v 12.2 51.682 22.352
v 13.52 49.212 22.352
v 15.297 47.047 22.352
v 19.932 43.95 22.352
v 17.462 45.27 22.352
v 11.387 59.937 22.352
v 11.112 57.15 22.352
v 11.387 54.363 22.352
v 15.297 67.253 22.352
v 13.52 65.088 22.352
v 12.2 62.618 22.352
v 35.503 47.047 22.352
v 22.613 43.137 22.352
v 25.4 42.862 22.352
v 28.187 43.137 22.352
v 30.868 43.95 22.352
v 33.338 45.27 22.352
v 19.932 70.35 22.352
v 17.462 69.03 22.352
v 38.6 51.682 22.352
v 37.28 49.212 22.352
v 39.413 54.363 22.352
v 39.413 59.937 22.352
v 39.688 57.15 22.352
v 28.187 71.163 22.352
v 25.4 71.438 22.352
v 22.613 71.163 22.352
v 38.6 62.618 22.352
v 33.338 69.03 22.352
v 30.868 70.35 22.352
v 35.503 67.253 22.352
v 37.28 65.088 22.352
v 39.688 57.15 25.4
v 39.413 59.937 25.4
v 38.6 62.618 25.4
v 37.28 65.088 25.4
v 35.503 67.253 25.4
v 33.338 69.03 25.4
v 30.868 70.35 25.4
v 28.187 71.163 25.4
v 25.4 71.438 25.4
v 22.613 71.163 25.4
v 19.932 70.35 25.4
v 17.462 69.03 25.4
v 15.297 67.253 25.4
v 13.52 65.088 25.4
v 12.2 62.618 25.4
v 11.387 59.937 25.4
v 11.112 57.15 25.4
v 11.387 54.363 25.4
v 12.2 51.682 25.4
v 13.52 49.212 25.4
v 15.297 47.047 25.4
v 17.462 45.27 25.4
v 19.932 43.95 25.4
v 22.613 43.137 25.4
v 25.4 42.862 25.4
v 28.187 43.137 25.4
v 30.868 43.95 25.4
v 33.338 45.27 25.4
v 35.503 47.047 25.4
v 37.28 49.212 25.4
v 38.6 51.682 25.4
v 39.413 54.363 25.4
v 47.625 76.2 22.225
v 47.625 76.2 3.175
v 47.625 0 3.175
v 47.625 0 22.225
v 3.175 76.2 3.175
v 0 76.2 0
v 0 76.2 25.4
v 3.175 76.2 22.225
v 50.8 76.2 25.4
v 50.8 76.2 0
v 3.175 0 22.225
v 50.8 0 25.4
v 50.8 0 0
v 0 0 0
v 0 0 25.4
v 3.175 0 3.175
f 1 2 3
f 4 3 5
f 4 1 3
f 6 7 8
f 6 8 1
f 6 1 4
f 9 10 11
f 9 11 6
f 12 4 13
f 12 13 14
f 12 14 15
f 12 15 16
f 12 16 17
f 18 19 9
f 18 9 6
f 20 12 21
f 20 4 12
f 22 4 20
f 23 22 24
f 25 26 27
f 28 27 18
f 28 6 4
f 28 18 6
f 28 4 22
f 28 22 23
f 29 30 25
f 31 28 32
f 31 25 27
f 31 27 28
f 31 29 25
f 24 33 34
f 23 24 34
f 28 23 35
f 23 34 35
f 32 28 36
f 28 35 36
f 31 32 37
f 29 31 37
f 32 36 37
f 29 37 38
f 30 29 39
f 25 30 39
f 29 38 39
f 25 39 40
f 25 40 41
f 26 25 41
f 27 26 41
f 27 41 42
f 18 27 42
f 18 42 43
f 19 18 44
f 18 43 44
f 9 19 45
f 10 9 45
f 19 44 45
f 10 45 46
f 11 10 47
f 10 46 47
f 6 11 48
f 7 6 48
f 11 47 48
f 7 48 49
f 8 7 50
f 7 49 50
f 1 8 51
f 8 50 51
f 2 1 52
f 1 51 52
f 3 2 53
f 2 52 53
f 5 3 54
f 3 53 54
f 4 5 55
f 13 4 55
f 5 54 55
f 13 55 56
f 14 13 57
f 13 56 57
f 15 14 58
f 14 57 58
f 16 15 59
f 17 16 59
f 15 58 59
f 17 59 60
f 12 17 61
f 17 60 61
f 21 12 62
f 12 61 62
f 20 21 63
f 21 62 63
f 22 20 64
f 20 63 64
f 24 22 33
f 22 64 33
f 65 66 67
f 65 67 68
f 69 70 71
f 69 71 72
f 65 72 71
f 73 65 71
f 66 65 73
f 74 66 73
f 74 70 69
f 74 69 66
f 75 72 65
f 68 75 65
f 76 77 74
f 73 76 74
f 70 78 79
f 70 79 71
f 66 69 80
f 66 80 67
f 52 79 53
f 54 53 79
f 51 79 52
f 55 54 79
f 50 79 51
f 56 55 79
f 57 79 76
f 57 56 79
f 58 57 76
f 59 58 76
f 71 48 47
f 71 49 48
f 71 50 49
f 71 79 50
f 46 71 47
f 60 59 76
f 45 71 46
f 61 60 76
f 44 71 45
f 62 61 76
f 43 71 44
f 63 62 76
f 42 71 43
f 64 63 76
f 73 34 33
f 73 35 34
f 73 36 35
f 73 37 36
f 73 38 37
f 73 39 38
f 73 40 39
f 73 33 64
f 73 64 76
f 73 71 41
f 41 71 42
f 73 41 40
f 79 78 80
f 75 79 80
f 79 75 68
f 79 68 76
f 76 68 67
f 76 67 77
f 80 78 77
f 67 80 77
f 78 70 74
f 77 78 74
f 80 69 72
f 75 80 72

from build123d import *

# Parameters (mm, degrees)
SKETCH1_W           = 50.8
SKETCH1_H           = 76.2
BOSS_EXTRUDE1_DEPTH = 25.4
SKETCH2_W           = 44.45
SKETCH2_H           = 19.05
CUT_EXTRUDE1_DEPTH  = 96.038097624
SKETCH3_R           = 14.2875
CUT_EXTRUDE2_DEPTH  = 3.048


with BuildPart() as part:
    # Sketch1 → Boss-Extrude1 (new body)
    with BuildSketch(Plane.XY):
        with Locations((25.4, 38.1)):
            Rectangle(SKETCH1_W, SKETCH1_H)
    extrude(amount=BOSS_EXTRUDE1_DEPTH)

    # Sketch2 → Cut-Extrude1 (cut, through all)
    with BuildSketch(Plane.XZ):
        with Locations((25.4, 12.7)):
            Rectangle(SKETCH2_W, SKETCH2_H)
    extrude(amount=-CUT_EXTRUDE1_DEPTH, mode=Mode.SUBTRACT)

    # Sketch3 → Cut-Extrude2 (cut)
    with BuildSketch(Plane.XY.offset(25.4)):
        with Locations((25.4, 57.15)):
            Circle(SKETCH3_R)
    extrude(amount=-CUT_EXTRUDE2_DEPTH, mode=Mode.SUBTRACT)


solid = part.part
